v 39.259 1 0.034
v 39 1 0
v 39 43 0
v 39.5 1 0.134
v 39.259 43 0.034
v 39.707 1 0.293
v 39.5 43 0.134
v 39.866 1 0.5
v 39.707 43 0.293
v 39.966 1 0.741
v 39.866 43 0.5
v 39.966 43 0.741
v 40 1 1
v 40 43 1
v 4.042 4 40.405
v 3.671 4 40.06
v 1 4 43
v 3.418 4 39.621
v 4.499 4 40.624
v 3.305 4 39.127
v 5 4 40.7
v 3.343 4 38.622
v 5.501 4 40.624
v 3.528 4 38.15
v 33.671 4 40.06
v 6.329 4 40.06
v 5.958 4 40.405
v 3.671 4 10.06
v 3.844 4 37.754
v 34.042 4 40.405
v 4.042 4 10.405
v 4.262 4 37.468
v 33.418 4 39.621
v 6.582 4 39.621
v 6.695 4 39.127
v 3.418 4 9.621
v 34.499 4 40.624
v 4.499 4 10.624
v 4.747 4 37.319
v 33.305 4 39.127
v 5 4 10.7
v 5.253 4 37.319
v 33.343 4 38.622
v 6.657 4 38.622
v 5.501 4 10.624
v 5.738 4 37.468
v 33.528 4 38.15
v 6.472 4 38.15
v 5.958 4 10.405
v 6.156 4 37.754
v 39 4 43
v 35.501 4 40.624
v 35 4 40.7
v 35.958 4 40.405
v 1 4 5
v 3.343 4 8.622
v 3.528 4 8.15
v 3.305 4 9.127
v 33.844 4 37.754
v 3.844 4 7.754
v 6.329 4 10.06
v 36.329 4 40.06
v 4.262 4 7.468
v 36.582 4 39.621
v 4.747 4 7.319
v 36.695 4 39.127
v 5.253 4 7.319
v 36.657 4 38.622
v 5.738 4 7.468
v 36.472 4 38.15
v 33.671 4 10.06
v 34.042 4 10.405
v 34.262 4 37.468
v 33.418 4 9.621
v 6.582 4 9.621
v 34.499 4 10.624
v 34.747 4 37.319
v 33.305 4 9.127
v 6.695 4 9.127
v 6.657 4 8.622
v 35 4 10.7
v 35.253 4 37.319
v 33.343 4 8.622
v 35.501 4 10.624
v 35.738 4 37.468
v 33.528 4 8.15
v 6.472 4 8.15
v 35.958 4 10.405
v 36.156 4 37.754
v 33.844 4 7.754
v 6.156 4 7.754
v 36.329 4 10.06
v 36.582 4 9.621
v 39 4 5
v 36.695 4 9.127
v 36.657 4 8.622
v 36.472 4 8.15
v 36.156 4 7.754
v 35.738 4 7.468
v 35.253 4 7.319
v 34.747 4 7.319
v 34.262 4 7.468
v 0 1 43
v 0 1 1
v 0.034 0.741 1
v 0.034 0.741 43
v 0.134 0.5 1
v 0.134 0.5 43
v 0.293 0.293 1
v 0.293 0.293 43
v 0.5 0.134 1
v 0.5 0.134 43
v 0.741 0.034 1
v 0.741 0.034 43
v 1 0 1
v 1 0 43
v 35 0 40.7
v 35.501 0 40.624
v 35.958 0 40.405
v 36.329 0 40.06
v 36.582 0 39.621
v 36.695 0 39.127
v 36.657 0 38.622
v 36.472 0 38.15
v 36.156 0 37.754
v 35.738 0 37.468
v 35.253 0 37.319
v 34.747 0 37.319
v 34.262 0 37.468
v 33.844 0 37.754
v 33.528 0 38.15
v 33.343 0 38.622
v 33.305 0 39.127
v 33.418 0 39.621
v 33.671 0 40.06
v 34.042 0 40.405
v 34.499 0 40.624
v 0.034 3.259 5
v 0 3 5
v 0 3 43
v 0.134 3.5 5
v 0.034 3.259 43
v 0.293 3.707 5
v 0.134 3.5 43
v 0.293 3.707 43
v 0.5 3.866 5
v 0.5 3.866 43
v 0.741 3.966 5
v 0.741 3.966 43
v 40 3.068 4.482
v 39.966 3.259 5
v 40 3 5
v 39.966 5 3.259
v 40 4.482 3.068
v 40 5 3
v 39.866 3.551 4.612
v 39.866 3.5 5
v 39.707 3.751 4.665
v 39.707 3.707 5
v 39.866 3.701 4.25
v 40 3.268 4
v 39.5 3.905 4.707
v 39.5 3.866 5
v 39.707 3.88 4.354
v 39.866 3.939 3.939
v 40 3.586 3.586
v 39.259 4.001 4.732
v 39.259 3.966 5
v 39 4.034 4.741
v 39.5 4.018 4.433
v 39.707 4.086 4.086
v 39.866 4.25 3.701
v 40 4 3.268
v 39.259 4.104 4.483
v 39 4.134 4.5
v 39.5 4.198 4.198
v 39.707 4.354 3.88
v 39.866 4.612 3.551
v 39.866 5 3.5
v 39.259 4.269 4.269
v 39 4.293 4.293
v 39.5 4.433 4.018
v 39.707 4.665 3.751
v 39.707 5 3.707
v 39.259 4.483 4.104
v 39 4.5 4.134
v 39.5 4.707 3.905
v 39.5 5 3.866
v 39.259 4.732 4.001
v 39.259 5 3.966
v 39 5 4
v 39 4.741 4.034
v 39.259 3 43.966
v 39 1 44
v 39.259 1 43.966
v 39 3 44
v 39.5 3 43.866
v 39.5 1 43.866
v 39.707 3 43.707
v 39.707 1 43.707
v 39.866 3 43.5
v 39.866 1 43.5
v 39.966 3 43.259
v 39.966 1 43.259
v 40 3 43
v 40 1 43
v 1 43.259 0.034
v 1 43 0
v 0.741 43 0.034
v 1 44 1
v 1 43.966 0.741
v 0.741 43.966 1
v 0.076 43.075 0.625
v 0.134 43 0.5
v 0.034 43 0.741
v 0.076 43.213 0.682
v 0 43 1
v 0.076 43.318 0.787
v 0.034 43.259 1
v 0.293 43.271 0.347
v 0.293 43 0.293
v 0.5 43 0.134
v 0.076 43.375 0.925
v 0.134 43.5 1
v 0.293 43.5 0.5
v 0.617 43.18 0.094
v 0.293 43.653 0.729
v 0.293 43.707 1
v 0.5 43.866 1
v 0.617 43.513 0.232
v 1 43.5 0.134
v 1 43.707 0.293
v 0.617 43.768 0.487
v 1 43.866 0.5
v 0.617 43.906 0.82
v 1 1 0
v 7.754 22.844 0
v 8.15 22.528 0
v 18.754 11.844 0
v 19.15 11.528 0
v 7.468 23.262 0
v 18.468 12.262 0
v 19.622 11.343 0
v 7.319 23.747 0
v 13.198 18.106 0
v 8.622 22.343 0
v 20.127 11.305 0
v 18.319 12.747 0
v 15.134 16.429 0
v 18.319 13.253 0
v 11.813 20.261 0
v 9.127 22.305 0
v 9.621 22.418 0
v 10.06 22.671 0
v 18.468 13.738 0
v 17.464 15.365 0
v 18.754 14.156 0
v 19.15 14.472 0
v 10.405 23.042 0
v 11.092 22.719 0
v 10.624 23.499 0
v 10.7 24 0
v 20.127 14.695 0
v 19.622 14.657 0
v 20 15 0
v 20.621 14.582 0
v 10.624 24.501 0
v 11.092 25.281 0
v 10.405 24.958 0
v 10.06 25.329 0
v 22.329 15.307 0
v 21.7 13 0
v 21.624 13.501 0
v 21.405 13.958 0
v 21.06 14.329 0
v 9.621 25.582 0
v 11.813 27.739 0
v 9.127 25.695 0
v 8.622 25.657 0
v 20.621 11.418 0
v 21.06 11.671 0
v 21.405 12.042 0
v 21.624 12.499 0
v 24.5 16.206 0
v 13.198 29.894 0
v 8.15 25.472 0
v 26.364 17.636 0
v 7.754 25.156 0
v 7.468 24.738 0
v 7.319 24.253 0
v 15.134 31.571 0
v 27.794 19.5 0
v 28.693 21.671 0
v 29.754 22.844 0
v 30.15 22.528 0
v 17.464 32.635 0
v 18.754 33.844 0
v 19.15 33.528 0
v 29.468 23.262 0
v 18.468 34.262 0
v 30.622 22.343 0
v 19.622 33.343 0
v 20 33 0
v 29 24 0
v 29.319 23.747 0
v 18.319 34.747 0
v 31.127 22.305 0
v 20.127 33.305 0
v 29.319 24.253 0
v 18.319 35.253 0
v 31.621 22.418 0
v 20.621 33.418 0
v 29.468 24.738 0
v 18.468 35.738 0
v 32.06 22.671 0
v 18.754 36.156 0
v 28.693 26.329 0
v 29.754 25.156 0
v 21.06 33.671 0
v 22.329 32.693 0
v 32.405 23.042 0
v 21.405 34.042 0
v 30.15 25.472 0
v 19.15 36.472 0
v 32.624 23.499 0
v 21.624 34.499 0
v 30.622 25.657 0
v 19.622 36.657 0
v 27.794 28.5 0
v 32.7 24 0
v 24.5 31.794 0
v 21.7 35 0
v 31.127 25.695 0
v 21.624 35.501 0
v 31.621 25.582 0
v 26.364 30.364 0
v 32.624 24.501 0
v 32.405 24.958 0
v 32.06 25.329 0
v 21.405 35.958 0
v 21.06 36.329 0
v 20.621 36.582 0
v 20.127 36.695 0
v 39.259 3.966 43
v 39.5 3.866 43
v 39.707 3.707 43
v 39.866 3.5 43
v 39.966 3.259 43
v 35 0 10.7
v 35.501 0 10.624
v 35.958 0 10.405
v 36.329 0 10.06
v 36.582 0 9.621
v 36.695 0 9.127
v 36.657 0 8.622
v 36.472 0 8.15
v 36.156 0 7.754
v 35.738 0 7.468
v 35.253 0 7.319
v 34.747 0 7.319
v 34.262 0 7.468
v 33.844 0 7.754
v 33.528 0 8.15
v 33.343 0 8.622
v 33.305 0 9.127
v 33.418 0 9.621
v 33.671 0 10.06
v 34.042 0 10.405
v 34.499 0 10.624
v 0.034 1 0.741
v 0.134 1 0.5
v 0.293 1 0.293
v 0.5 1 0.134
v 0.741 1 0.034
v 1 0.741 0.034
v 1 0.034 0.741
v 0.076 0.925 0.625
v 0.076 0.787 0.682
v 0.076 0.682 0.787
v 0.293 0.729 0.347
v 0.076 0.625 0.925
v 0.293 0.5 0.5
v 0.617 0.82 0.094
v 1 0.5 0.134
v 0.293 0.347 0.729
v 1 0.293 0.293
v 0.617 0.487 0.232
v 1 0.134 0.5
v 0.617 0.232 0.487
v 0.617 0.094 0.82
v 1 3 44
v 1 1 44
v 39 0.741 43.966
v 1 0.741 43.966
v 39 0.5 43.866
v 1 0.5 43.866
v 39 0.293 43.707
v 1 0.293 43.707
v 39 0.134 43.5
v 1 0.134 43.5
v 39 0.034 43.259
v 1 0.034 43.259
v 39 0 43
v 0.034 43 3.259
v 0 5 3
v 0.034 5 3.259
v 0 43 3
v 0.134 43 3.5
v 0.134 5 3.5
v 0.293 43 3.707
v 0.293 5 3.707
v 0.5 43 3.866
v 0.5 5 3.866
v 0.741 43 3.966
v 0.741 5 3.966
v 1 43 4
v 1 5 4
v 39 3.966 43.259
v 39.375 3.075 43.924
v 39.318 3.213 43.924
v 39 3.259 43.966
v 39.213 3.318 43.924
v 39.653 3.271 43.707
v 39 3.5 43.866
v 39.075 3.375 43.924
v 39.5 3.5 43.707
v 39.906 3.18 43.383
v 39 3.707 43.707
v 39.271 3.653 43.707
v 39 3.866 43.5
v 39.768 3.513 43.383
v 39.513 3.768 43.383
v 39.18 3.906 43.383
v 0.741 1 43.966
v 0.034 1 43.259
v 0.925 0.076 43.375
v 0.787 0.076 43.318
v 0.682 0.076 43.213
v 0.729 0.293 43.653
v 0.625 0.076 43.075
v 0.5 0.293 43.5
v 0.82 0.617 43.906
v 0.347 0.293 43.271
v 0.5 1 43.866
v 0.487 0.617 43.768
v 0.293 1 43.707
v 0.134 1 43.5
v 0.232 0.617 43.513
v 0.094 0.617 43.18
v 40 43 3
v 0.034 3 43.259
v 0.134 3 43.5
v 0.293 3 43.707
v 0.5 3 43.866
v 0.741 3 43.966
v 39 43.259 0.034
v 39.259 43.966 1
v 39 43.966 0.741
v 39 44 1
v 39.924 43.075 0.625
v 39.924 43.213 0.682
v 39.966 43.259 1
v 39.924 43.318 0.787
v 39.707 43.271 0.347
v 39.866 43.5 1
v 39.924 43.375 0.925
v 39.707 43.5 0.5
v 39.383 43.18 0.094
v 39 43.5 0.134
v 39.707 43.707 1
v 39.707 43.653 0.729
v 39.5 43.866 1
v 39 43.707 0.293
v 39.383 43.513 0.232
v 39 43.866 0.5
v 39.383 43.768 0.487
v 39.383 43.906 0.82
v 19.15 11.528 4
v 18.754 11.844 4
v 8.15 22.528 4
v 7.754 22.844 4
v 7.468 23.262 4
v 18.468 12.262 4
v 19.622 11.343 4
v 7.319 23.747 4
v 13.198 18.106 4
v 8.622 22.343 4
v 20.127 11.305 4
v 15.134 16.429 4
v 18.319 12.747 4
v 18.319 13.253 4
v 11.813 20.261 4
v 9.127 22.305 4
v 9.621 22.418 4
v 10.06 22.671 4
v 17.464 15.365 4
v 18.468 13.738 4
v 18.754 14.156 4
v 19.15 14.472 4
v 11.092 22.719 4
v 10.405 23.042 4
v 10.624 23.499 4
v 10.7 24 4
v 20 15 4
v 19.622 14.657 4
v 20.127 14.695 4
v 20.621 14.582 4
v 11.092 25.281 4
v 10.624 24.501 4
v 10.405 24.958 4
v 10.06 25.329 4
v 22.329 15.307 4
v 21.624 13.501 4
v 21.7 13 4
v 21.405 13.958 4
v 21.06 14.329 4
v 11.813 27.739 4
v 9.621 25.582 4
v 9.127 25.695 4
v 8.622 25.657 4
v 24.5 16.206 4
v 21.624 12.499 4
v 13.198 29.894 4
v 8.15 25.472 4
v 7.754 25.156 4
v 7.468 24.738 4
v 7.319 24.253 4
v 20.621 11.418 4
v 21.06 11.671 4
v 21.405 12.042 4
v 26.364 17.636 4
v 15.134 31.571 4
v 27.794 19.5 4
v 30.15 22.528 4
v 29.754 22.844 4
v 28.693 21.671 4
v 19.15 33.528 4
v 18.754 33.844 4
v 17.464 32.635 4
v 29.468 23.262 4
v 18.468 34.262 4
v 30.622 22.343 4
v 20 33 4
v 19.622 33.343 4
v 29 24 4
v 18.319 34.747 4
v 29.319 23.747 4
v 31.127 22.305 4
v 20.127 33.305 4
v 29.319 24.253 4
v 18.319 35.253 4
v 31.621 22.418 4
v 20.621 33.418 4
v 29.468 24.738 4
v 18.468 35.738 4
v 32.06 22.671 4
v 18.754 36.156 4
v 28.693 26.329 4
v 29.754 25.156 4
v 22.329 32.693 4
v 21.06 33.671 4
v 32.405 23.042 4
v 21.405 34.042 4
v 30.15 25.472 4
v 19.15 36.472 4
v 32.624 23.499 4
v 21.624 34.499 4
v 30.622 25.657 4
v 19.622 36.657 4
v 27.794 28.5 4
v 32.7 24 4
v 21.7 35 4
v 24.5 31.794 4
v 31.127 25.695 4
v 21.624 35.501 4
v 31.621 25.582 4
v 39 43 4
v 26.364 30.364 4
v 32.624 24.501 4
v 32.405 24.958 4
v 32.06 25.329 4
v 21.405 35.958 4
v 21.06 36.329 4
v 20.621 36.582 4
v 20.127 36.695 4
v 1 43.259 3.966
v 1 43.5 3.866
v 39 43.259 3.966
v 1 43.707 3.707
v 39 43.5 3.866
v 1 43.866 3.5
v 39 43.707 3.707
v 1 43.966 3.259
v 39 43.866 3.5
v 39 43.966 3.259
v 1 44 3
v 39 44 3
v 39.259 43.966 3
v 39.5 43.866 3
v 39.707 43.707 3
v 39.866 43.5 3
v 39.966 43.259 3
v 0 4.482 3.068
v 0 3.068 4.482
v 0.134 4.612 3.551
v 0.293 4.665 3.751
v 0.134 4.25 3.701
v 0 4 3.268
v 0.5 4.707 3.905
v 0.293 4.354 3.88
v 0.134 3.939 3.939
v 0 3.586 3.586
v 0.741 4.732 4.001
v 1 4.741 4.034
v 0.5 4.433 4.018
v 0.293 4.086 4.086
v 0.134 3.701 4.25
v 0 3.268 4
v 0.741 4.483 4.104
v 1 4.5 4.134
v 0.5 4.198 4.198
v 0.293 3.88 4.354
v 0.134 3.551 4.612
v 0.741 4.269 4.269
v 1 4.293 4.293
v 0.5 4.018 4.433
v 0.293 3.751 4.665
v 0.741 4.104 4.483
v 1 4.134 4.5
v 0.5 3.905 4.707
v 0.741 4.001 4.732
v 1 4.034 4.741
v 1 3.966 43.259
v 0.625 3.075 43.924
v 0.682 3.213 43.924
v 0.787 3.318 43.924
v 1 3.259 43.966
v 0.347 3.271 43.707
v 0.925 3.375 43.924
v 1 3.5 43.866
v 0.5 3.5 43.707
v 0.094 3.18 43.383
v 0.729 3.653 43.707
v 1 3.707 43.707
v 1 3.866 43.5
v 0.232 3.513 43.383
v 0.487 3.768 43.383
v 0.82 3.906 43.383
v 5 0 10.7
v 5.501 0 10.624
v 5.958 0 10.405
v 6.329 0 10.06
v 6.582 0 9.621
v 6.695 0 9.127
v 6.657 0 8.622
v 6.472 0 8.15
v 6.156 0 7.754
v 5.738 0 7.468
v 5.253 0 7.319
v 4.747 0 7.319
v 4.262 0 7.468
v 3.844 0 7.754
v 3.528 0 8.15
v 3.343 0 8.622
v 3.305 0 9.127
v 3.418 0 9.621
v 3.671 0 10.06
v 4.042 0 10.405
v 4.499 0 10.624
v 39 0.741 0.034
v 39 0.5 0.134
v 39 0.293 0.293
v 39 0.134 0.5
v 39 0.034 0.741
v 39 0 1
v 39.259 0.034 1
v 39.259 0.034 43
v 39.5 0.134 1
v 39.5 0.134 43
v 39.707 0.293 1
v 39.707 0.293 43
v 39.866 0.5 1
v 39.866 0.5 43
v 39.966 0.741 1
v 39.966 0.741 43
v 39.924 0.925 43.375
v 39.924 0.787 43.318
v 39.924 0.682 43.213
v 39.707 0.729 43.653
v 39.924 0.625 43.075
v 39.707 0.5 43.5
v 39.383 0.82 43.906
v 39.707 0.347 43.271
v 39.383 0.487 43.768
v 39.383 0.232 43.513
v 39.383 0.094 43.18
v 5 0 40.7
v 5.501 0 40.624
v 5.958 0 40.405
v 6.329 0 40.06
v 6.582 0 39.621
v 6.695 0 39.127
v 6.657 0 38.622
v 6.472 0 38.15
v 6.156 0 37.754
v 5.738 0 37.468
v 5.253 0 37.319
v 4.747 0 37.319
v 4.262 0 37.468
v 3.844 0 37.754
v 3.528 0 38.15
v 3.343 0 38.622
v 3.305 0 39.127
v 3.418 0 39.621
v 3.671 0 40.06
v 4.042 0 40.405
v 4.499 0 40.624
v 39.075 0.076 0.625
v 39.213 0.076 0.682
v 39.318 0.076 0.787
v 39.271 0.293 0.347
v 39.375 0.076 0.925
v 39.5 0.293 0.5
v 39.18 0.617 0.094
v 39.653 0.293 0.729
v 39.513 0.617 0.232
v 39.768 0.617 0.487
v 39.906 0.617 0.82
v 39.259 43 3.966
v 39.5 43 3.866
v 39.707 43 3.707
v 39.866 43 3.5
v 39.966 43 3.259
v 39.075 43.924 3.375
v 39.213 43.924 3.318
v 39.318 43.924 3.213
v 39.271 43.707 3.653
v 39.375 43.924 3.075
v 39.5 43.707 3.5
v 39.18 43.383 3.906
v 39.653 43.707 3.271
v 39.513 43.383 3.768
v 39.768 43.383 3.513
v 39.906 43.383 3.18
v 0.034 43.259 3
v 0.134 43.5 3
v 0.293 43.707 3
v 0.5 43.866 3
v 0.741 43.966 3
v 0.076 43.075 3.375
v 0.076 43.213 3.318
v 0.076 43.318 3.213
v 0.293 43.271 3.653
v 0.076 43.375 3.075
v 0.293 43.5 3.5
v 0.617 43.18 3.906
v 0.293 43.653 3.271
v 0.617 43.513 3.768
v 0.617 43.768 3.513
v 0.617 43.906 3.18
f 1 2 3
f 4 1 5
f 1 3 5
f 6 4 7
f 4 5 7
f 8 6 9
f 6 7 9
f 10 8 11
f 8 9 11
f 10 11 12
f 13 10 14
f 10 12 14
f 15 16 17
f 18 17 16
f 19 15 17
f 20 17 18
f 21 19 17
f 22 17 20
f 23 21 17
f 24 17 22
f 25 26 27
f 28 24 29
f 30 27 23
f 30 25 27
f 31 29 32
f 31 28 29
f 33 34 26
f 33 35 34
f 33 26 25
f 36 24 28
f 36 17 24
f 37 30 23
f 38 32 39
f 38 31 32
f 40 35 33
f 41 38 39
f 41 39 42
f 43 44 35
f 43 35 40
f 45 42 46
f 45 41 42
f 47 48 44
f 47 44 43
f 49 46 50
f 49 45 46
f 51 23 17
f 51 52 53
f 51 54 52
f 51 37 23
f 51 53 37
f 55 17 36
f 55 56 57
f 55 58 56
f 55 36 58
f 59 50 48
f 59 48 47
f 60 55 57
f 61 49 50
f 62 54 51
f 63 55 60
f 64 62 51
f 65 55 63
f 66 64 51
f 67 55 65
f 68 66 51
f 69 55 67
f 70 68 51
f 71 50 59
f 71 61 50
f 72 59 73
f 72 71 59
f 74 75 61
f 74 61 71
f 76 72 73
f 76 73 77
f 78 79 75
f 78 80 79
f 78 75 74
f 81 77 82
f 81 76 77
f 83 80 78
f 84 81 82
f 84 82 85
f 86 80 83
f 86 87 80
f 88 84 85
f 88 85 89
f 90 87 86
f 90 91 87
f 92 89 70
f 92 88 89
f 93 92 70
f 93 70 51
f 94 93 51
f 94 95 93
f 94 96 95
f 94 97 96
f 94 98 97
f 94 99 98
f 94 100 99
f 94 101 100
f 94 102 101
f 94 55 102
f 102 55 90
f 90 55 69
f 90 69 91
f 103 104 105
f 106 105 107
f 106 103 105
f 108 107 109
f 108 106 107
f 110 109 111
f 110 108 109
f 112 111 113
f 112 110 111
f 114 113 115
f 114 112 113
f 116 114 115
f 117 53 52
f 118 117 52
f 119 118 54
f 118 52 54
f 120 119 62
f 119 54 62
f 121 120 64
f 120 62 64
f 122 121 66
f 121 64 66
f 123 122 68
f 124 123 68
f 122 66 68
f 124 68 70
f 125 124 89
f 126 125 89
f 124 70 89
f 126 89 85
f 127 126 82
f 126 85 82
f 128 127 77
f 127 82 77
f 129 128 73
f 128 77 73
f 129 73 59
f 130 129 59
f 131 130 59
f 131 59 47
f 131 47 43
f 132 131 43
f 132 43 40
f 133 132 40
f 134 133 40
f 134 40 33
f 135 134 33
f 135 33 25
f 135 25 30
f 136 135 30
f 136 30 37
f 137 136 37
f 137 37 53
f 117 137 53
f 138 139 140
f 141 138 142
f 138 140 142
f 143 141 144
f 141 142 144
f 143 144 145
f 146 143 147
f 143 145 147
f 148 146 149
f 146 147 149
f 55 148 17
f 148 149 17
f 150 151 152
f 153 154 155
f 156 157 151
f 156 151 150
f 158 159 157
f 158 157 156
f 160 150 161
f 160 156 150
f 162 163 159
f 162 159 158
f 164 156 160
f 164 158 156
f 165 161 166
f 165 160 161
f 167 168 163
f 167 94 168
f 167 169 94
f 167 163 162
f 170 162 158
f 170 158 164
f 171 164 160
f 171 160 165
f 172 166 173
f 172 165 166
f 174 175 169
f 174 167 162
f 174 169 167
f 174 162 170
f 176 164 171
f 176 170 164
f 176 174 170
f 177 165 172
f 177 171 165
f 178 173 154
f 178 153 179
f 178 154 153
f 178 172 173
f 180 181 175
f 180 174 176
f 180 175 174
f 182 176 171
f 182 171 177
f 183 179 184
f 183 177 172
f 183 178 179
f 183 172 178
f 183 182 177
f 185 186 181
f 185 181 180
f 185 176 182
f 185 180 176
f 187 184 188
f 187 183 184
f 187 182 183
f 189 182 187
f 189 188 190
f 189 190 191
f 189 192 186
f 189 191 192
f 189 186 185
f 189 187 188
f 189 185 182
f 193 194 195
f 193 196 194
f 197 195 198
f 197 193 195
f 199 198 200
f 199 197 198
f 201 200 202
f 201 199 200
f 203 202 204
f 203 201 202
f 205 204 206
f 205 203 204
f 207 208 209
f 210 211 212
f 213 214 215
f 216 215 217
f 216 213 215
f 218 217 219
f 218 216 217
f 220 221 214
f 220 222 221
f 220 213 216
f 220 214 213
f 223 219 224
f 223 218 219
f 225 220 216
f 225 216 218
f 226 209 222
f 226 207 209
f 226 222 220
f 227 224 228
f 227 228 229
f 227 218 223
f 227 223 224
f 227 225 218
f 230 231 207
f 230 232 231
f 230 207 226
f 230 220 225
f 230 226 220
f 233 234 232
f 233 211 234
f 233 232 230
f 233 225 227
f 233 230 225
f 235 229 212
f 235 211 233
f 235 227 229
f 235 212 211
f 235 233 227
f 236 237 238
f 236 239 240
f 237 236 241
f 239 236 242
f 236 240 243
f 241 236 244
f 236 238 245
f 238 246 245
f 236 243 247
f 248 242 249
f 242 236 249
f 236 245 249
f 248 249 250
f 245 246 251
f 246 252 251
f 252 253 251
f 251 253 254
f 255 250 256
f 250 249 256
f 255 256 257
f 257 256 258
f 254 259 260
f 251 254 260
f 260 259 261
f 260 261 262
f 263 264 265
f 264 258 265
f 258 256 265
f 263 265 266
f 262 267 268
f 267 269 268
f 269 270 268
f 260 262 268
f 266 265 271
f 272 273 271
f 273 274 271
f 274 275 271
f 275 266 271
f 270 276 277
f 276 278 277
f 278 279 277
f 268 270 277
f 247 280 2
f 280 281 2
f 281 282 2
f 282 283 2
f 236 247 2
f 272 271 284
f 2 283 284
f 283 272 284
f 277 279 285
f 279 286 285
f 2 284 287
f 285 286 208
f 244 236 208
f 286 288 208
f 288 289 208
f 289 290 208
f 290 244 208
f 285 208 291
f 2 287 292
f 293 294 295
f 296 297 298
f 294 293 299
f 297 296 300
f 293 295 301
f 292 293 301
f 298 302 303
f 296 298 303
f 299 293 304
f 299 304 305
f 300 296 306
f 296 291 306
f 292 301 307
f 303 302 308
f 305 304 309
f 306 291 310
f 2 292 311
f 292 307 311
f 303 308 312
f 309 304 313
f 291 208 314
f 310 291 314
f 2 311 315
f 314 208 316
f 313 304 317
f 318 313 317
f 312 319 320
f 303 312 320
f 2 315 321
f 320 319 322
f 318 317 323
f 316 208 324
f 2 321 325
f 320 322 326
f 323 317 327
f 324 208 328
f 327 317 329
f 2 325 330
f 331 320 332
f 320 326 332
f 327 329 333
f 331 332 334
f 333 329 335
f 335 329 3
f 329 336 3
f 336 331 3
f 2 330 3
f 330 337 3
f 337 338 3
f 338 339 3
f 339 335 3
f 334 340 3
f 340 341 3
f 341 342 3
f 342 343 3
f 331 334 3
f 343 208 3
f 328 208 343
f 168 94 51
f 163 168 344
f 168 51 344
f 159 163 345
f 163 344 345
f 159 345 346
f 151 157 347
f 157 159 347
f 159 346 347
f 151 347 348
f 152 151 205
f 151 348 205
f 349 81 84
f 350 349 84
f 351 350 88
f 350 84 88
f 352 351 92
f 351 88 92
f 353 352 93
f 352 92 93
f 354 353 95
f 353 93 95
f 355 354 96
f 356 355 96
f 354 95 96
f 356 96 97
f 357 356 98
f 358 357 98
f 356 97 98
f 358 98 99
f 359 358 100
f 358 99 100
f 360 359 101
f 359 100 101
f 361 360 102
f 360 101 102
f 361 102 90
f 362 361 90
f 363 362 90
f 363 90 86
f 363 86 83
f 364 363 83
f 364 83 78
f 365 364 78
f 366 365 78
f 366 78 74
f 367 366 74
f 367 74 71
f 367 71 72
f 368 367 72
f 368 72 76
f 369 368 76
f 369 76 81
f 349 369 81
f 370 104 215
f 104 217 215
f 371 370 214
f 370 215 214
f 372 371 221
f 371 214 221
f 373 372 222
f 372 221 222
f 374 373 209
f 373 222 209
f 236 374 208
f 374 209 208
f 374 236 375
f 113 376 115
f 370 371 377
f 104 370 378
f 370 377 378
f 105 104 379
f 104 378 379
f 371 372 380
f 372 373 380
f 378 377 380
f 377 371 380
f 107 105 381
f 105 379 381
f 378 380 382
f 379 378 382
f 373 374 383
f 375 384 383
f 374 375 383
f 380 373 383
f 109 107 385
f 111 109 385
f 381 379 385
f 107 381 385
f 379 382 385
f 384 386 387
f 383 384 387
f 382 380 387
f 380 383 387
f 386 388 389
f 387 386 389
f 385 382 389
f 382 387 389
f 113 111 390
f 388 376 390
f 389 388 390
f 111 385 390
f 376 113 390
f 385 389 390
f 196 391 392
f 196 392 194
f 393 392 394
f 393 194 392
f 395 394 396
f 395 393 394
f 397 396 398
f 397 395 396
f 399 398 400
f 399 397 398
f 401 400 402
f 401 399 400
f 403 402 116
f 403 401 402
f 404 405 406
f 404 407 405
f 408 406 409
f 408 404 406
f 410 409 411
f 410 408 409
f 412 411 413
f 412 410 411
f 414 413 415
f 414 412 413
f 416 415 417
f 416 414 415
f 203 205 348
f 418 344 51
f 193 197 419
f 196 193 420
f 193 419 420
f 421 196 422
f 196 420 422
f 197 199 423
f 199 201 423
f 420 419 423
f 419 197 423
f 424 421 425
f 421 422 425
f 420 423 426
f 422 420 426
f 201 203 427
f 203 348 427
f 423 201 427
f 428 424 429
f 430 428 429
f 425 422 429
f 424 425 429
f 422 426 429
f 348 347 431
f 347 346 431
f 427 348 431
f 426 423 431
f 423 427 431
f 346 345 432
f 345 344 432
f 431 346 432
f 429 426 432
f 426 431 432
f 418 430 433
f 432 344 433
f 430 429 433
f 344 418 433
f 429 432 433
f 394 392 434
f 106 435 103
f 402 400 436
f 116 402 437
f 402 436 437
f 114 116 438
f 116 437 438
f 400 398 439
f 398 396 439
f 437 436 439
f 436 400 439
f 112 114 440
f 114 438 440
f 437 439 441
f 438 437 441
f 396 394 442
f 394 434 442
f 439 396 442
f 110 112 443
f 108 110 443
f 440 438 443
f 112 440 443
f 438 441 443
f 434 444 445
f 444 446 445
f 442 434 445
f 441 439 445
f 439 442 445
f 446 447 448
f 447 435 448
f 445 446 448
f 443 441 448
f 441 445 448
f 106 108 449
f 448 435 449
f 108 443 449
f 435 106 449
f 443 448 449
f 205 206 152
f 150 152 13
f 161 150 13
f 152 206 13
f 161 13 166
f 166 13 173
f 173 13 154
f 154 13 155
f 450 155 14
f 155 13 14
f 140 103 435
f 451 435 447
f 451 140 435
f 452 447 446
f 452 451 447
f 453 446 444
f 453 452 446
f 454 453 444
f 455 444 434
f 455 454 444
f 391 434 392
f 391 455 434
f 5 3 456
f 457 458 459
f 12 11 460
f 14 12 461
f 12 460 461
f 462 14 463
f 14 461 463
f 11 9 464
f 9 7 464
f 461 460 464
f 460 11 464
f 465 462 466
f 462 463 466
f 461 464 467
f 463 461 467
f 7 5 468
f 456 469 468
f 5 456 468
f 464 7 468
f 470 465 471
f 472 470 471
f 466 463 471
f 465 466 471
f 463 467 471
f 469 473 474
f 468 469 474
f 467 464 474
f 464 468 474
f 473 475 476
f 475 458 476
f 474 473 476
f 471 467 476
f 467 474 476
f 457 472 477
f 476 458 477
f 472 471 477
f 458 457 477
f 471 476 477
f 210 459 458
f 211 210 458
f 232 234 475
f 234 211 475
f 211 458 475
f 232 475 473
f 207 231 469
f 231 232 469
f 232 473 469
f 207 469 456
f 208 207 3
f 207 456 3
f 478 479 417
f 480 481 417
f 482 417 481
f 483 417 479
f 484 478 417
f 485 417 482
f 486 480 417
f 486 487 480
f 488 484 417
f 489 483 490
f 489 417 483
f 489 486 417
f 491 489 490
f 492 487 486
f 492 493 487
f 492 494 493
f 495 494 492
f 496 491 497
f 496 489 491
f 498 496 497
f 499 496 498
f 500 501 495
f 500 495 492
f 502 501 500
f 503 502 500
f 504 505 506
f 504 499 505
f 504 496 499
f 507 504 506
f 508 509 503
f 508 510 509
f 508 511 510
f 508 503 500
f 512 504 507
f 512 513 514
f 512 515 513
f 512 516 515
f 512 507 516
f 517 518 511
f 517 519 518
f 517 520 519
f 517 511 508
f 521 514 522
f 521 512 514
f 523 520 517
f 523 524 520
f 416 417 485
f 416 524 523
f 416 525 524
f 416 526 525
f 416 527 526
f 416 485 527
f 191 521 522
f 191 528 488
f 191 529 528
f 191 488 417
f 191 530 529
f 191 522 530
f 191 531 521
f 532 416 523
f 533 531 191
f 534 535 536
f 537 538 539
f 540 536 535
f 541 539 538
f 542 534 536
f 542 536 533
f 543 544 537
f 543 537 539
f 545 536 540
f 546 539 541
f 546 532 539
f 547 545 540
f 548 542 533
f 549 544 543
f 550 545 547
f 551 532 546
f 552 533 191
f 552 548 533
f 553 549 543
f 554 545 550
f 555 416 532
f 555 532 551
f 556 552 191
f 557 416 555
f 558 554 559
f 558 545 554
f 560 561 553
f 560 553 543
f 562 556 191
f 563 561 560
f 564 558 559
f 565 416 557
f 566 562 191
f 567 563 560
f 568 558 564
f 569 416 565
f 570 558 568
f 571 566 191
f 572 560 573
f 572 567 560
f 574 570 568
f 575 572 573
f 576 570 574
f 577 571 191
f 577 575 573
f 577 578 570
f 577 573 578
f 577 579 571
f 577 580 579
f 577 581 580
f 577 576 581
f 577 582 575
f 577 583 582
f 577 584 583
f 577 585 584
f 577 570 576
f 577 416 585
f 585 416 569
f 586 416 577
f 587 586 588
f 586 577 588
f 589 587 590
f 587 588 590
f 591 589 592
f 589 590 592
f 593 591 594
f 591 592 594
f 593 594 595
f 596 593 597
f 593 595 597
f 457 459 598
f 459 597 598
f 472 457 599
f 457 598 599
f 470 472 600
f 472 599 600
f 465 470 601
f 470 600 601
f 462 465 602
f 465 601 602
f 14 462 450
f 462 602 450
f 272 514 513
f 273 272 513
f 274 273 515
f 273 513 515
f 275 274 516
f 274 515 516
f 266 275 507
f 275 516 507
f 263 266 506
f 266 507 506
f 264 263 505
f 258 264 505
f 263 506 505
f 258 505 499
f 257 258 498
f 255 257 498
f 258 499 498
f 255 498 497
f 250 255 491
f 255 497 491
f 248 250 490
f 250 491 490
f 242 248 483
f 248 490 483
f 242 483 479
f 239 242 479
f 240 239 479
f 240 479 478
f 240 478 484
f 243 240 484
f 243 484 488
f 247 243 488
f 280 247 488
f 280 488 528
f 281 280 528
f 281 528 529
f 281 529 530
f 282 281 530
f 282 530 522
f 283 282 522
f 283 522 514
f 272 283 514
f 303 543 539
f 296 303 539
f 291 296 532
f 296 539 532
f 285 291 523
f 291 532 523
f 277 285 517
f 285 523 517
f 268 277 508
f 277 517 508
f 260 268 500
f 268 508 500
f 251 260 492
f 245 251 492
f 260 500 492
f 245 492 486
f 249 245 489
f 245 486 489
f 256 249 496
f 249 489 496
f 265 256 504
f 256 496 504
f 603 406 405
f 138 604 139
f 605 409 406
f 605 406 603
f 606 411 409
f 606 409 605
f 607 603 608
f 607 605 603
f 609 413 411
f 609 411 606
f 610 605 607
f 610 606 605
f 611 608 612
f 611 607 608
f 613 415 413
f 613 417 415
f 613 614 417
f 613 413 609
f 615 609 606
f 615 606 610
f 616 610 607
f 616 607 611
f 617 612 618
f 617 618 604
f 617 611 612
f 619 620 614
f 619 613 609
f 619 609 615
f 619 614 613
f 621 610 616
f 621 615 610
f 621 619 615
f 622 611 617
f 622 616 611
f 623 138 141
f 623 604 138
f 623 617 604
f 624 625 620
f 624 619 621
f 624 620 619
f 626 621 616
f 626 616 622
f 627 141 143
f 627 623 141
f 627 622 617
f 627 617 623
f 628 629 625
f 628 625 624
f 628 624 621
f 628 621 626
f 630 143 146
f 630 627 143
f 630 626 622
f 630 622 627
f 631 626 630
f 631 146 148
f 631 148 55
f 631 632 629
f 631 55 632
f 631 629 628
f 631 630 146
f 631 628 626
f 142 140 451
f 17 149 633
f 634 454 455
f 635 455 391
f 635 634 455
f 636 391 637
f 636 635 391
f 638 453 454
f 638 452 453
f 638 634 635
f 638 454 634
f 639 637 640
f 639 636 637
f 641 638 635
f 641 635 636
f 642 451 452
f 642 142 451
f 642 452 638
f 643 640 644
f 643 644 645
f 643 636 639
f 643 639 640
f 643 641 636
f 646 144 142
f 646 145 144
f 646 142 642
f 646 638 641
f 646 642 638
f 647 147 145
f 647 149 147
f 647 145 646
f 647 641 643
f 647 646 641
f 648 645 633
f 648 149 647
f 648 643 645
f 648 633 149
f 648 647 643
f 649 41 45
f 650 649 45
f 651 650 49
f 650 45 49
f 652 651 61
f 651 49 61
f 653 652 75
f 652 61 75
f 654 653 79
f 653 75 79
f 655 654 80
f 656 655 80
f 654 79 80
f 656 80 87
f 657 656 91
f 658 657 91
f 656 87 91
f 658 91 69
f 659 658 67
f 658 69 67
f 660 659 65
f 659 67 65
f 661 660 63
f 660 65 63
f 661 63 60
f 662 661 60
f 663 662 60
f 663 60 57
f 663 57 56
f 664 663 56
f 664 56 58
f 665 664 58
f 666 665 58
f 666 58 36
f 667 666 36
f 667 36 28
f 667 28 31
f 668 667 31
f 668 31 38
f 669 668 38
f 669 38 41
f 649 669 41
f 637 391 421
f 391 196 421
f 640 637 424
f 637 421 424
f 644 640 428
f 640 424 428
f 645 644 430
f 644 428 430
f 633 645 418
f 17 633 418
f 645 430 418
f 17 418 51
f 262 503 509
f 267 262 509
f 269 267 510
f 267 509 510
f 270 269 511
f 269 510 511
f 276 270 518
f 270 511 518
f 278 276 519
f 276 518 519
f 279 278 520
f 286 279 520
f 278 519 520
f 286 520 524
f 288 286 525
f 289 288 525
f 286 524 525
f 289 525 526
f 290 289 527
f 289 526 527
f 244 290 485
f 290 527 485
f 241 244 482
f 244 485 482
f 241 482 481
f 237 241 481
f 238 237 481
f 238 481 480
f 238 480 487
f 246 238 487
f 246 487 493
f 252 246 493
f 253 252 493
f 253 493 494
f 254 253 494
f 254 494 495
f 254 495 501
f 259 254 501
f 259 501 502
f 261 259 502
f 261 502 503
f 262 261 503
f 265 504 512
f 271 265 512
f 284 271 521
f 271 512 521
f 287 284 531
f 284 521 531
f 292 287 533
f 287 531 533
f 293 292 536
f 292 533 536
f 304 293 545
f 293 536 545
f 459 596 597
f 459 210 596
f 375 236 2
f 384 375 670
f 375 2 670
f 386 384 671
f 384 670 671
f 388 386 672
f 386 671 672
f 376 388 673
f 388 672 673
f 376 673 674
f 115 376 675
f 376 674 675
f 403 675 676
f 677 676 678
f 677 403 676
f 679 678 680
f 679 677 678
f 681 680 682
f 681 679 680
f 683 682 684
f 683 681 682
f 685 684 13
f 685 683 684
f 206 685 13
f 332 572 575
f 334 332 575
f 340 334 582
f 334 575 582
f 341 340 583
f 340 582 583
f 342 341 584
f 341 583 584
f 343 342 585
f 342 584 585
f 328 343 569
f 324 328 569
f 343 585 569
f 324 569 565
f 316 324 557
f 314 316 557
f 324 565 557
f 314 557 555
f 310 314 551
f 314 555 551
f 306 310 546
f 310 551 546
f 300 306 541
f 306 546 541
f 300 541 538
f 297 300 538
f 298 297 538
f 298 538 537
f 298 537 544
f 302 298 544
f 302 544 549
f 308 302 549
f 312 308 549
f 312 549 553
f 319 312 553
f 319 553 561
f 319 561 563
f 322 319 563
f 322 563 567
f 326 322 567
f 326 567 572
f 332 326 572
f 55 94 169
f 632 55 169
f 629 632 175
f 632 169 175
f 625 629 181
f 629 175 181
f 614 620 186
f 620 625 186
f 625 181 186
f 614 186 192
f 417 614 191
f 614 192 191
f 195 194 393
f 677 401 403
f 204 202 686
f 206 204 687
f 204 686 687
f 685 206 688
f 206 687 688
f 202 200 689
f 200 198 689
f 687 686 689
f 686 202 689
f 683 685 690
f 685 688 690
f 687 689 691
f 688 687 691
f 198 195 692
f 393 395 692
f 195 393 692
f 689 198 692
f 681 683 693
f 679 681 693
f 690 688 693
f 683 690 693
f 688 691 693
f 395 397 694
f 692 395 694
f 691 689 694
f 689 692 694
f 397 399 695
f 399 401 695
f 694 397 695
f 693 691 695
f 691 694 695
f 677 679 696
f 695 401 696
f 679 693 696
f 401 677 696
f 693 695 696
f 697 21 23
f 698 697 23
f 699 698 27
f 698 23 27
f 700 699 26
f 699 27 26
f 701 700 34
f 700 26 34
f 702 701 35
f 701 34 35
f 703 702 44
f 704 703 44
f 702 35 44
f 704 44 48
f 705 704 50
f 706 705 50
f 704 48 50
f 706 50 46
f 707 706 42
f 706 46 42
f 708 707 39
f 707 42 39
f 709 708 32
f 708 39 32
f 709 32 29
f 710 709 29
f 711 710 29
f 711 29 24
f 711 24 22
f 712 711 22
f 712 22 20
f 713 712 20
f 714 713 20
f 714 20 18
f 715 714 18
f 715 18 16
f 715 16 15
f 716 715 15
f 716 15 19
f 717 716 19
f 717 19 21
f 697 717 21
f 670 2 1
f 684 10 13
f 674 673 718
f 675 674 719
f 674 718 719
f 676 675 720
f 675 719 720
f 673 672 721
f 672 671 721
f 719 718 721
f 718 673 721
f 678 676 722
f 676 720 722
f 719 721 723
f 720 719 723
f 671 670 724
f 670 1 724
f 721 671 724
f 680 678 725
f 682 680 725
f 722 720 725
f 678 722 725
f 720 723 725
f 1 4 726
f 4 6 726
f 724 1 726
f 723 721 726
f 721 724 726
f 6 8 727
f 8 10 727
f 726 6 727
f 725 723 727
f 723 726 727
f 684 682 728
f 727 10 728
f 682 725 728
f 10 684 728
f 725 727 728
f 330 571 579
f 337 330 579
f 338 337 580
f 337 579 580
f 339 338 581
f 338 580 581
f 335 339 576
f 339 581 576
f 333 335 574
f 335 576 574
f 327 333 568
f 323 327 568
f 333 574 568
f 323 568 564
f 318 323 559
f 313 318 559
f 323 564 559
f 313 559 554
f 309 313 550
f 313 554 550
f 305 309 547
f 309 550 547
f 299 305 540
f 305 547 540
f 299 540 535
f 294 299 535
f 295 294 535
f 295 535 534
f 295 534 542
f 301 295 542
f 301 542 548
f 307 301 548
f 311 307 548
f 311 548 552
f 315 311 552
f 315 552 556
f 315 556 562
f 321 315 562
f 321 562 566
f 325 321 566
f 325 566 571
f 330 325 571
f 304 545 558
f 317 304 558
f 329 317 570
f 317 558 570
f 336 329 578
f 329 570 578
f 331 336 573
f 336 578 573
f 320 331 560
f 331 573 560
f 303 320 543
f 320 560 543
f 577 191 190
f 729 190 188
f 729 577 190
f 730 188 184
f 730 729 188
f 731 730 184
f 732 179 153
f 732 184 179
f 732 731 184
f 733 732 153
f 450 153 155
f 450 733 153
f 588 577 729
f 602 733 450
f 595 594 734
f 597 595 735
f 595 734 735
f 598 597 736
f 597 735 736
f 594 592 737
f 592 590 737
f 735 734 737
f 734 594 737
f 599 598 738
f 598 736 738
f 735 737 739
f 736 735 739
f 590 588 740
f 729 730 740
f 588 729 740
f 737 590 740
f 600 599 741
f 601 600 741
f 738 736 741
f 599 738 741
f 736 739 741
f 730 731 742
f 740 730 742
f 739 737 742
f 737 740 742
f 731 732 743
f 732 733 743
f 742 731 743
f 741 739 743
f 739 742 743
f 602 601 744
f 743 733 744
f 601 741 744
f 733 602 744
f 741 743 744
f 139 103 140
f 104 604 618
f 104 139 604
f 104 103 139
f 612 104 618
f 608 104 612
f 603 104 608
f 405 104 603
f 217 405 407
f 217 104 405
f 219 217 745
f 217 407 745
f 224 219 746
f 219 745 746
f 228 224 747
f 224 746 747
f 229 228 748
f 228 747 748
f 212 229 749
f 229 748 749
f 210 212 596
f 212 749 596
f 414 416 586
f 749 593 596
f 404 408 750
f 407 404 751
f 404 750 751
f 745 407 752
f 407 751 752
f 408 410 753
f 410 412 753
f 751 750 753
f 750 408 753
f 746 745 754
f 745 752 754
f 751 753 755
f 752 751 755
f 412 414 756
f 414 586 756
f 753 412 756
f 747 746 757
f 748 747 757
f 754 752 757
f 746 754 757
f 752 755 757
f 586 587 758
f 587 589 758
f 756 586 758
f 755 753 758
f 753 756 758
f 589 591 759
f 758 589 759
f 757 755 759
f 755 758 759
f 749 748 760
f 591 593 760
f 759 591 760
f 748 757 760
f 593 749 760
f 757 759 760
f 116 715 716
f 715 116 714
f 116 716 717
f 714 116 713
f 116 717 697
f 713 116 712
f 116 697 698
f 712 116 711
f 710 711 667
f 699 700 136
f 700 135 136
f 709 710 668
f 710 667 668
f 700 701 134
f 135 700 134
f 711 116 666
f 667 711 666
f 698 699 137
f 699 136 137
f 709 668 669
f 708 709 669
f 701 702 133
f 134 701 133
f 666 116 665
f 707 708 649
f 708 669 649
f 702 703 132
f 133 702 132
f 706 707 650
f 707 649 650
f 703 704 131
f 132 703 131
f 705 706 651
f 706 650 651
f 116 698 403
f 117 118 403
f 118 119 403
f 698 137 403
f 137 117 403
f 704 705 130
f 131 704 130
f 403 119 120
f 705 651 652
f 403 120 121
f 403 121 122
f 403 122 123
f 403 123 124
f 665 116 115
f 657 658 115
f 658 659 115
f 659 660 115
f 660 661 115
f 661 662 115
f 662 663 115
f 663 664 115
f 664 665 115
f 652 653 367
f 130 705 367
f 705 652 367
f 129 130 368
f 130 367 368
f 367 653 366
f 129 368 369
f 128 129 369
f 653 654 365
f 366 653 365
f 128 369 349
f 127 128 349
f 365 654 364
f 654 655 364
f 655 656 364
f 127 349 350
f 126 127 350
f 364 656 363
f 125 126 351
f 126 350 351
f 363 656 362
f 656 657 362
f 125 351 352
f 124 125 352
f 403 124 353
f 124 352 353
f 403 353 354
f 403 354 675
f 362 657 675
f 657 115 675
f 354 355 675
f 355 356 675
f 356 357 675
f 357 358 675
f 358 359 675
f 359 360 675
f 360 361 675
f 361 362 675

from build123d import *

# Parameters (mm, degrees)
SKETCH2_W           = 40
SKETCH2_H           = 44
BOSS_EXTRUDE1_DEPTH = 4
SKETCH4_W           = 40
SKETCH4_H           = 4
BOSS_EXTRUDE2_DEPTH = 40
SKETCH5_R           = 1.7
CUT_EXTRUDE1_DEPTH  = 72.665891469
SKETCH8_R           = 1.7
CUT_EXTRUDE4_DEPTH  = 72.665891469
FILLET2_R           = 1


with BuildPart() as part:
    # Sketch2 → Boss-Extrude1 (new body)
    with BuildSketch(Plane.XY):
        with Locations((20, 22)):
            Rectangle(SKETCH2_W, SKETCH2_H)
    extrude(amount=BOSS_EXTRUDE1_DEPTH)

    # Sketch4 → Boss-Extrude2 (add)
    with BuildSketch(Plane.XY.offset(4)):
        with Locations((20, 2)):
            Rectangle(SKETCH4_W, SKETCH4_H)
    extrude(amount=BOSS_EXTRUDE2_DEPTH)

    # Sketch5 → Cut-Extrude1 (cut, through all)
    with BuildSketch(Plane.XY.offset(4)):
        with BuildLine():
            ThreePointArc((29, 24), (26.363961031, 30.363961031), (20, 33))
            Line((20, 33), (20, 15))
            ThreePointArc((20, 15), (26.363961031, 17.636038969), (29, 24))
        make_face()
        with BuildLine():
            Line((20, 15), (20, 33))
            ThreePointArc((20, 33), (11, 24), (20, 15))
        make_face()
        with Locations((9, 24)):
            Circle(SKETCH5_R)
        with Locations((20, 35)):
            Circle(SKETCH5_R)
        with Locations((31, 24)):
            Circle(SKETCH5_R)
        with Locations((20, 13)):
            Circle(SKETCH5_R)
    extrude(amount=-CUT_EXTRUDE1_DEPTH, mode=Mode.SUBTRACT)

    # Sketch8 → Cut-Extrude4 (cut, through all)
    with BuildSketch(Plane(origin=(0, 4, 0), x_dir=(1, 0, 0), z_dir=(0, 1, 0))):
        with Locations(Location((5, -9, 0), (0, 0, 270))):
            Circle(SKETCH8_R)
        with Locations(Location((35, -9, 0), (0, 0, 270))):
            Circle(SKETCH8_R)
        with Locations(Location((35, -39, 0), (0, 0, 270))):
            Circle(SKETCH8_R)
        with Locations(Location((5, -39, 0), (0, 0, 270))):
            Circle(SKETCH8_R)
    extrude(amount=-CUT_EXTRUDE4_DEPTH, mode=Mode.SUBTRACT)

    # Fillet2
    fillet2_edges = [part.edges().sort_by_distance(p)[0] for p in [
        (40, 24, 4),
        (0, 4, 24),
        (20, 44, 4),
        (20, 4, 4),
        (40, 4, 24),
        (0, 2, 44),
        (20, 0, 44),
        (40, 2, 44),
        (20, 4, 44),
        (0, 24, 4),
        (20, 44, 0),
        (40, 22, 0),
        (20, 0, 0),
        (0, 22, 0),
        (0, 44, 2),
        (40, 44, 2),
        (40, 0, 22),
        (0, 0, 22),
    ]]
    fillet(fillet2_edges, radius=FILLET2_R)


solid = part.part
